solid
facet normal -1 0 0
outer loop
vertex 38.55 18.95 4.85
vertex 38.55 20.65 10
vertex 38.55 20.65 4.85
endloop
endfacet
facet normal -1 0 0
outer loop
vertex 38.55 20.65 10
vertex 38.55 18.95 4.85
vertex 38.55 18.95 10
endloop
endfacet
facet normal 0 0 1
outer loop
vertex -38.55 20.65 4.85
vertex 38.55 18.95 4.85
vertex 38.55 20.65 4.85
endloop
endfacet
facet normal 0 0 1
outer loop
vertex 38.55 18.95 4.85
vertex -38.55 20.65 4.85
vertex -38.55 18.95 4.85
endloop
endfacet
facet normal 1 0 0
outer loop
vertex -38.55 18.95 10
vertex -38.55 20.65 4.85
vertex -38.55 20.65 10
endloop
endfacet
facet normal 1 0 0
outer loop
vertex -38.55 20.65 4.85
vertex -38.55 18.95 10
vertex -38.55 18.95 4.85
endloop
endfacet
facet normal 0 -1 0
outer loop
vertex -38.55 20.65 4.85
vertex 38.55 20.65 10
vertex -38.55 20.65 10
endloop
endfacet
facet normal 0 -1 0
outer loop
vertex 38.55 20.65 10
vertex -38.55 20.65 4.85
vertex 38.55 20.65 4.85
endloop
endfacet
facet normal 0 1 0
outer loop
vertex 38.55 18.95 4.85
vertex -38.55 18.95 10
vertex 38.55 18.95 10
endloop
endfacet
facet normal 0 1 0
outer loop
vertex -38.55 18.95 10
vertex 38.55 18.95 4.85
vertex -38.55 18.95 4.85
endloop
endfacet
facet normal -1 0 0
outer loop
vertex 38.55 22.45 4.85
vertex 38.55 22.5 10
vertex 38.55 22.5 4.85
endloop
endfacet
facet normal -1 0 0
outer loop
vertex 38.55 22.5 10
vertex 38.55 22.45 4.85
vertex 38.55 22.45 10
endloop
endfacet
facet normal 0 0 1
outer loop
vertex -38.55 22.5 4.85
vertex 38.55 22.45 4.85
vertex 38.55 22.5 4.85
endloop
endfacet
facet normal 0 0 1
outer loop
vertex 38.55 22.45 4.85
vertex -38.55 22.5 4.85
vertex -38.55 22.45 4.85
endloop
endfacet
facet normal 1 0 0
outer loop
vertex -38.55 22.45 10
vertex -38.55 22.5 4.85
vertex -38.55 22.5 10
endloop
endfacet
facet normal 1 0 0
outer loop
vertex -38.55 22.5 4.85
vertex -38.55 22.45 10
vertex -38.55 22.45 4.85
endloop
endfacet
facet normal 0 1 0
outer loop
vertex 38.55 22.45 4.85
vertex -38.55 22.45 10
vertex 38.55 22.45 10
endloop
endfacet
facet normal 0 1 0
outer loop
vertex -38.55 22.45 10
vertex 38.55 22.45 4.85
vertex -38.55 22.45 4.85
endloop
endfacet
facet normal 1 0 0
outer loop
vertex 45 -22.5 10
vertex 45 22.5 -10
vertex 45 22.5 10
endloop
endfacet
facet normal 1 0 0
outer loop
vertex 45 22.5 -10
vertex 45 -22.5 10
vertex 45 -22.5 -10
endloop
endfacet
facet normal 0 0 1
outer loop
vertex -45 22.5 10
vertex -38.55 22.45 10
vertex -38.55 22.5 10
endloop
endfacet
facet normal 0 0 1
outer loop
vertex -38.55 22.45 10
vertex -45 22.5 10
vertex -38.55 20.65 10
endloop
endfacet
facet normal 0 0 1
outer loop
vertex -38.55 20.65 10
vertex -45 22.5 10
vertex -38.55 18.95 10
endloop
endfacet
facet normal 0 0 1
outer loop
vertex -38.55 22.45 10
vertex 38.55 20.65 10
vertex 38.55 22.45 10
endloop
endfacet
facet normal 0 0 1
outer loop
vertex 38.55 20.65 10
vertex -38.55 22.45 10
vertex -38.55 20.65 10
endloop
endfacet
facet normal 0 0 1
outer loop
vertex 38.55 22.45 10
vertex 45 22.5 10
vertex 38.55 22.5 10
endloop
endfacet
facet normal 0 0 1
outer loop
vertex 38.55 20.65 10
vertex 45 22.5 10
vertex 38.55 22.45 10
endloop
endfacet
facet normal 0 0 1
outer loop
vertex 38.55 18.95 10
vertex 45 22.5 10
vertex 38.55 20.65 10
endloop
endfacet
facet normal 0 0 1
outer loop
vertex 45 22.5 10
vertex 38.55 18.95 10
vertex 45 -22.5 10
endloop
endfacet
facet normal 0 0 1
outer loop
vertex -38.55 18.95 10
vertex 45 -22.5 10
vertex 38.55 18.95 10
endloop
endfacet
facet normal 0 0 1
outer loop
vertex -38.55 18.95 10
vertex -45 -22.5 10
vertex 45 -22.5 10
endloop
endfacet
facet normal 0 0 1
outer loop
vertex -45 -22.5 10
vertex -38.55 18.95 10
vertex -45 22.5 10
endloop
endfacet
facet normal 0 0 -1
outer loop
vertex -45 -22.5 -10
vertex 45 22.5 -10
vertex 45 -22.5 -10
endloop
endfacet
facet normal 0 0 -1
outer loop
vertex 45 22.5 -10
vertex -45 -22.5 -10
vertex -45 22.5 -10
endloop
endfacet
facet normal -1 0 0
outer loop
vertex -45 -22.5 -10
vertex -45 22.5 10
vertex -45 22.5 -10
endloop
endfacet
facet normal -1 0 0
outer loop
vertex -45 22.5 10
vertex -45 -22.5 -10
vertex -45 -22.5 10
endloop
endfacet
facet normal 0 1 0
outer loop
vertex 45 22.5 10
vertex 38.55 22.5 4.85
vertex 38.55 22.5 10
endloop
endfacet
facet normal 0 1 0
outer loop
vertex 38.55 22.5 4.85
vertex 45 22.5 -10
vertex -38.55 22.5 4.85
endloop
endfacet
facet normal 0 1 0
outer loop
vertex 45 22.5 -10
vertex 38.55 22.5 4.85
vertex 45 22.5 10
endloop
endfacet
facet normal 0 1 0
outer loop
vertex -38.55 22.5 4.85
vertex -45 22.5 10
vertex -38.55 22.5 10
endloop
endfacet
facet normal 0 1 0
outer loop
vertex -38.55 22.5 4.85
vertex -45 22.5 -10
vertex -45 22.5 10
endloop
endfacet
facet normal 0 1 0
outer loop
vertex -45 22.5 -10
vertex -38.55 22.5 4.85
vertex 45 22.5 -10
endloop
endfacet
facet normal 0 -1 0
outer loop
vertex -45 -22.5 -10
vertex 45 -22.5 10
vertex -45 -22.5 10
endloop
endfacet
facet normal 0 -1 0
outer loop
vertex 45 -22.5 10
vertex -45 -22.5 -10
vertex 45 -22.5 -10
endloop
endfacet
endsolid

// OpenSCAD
// Dimensions in millimetres
block_length = 90;      // X dimension
block_width = 45;       // Y dimension
block_height = 20;      // Z dimension

slide_length = 75;      // Length of the slide
slide_width = 25;       // Width of the slide
slide_thickness = 1;    // Thickness of the slide

slot_length = 77;       // Length of the slot (slightly shorter than block to allow for walls)
slot_width = 1.6;       // Width of the slot
slot_depth = 10;        // Depth of the slot (how deep the cut is)
slot_spacing = 3.5;     // Centre-to-centre distance between slots

// Derived dimensions
// Calculate the number of slots that fit within the block width
// We use a for loop to determine the exact count based on spacing
num_slots = 0;
for (i = [0 : 1]) {
    if ((i * slot_spacing) + (slot_width / 2) < (block_width / 2)) {
        num_slots = i + 1;
    }
}

// Calculate the total width occupied by the slots
total_slot_width = (num_slots * slot_width) + ((num_slots - 1) * slot_spacing);

// Calculate the offset to center the group of slots
slot_offset = (block_width - total_slot_width) / 2;

$fn = 64;

module base_block() {
    cube([block_length, block_width, block_height], center=true);
}

module slot_cutout() {
    // The slot is a rectangular prism cut into the top face
    // We extend it slightly past the block faces to ensure clean cuts
    translate([0, block_width/2, block_height - slot_depth - 0.1])
    cube([slot_length + 0.1, slot_width + 0.1, slot_depth + 0.1], center=true);
}

module drying_rack() {
    difference() {
        base_block();
        
        // Create the slots
        for (i = [0 : num_slots - 1]) {
            // Calculate Y position for each slot
            y_pos = (i * slot_spacing) + (slot_width / 2);
            
            translate([0, y_pos, 0])
            slot_cutout();
        }
    }
}

// Render the part
drying_rack();
